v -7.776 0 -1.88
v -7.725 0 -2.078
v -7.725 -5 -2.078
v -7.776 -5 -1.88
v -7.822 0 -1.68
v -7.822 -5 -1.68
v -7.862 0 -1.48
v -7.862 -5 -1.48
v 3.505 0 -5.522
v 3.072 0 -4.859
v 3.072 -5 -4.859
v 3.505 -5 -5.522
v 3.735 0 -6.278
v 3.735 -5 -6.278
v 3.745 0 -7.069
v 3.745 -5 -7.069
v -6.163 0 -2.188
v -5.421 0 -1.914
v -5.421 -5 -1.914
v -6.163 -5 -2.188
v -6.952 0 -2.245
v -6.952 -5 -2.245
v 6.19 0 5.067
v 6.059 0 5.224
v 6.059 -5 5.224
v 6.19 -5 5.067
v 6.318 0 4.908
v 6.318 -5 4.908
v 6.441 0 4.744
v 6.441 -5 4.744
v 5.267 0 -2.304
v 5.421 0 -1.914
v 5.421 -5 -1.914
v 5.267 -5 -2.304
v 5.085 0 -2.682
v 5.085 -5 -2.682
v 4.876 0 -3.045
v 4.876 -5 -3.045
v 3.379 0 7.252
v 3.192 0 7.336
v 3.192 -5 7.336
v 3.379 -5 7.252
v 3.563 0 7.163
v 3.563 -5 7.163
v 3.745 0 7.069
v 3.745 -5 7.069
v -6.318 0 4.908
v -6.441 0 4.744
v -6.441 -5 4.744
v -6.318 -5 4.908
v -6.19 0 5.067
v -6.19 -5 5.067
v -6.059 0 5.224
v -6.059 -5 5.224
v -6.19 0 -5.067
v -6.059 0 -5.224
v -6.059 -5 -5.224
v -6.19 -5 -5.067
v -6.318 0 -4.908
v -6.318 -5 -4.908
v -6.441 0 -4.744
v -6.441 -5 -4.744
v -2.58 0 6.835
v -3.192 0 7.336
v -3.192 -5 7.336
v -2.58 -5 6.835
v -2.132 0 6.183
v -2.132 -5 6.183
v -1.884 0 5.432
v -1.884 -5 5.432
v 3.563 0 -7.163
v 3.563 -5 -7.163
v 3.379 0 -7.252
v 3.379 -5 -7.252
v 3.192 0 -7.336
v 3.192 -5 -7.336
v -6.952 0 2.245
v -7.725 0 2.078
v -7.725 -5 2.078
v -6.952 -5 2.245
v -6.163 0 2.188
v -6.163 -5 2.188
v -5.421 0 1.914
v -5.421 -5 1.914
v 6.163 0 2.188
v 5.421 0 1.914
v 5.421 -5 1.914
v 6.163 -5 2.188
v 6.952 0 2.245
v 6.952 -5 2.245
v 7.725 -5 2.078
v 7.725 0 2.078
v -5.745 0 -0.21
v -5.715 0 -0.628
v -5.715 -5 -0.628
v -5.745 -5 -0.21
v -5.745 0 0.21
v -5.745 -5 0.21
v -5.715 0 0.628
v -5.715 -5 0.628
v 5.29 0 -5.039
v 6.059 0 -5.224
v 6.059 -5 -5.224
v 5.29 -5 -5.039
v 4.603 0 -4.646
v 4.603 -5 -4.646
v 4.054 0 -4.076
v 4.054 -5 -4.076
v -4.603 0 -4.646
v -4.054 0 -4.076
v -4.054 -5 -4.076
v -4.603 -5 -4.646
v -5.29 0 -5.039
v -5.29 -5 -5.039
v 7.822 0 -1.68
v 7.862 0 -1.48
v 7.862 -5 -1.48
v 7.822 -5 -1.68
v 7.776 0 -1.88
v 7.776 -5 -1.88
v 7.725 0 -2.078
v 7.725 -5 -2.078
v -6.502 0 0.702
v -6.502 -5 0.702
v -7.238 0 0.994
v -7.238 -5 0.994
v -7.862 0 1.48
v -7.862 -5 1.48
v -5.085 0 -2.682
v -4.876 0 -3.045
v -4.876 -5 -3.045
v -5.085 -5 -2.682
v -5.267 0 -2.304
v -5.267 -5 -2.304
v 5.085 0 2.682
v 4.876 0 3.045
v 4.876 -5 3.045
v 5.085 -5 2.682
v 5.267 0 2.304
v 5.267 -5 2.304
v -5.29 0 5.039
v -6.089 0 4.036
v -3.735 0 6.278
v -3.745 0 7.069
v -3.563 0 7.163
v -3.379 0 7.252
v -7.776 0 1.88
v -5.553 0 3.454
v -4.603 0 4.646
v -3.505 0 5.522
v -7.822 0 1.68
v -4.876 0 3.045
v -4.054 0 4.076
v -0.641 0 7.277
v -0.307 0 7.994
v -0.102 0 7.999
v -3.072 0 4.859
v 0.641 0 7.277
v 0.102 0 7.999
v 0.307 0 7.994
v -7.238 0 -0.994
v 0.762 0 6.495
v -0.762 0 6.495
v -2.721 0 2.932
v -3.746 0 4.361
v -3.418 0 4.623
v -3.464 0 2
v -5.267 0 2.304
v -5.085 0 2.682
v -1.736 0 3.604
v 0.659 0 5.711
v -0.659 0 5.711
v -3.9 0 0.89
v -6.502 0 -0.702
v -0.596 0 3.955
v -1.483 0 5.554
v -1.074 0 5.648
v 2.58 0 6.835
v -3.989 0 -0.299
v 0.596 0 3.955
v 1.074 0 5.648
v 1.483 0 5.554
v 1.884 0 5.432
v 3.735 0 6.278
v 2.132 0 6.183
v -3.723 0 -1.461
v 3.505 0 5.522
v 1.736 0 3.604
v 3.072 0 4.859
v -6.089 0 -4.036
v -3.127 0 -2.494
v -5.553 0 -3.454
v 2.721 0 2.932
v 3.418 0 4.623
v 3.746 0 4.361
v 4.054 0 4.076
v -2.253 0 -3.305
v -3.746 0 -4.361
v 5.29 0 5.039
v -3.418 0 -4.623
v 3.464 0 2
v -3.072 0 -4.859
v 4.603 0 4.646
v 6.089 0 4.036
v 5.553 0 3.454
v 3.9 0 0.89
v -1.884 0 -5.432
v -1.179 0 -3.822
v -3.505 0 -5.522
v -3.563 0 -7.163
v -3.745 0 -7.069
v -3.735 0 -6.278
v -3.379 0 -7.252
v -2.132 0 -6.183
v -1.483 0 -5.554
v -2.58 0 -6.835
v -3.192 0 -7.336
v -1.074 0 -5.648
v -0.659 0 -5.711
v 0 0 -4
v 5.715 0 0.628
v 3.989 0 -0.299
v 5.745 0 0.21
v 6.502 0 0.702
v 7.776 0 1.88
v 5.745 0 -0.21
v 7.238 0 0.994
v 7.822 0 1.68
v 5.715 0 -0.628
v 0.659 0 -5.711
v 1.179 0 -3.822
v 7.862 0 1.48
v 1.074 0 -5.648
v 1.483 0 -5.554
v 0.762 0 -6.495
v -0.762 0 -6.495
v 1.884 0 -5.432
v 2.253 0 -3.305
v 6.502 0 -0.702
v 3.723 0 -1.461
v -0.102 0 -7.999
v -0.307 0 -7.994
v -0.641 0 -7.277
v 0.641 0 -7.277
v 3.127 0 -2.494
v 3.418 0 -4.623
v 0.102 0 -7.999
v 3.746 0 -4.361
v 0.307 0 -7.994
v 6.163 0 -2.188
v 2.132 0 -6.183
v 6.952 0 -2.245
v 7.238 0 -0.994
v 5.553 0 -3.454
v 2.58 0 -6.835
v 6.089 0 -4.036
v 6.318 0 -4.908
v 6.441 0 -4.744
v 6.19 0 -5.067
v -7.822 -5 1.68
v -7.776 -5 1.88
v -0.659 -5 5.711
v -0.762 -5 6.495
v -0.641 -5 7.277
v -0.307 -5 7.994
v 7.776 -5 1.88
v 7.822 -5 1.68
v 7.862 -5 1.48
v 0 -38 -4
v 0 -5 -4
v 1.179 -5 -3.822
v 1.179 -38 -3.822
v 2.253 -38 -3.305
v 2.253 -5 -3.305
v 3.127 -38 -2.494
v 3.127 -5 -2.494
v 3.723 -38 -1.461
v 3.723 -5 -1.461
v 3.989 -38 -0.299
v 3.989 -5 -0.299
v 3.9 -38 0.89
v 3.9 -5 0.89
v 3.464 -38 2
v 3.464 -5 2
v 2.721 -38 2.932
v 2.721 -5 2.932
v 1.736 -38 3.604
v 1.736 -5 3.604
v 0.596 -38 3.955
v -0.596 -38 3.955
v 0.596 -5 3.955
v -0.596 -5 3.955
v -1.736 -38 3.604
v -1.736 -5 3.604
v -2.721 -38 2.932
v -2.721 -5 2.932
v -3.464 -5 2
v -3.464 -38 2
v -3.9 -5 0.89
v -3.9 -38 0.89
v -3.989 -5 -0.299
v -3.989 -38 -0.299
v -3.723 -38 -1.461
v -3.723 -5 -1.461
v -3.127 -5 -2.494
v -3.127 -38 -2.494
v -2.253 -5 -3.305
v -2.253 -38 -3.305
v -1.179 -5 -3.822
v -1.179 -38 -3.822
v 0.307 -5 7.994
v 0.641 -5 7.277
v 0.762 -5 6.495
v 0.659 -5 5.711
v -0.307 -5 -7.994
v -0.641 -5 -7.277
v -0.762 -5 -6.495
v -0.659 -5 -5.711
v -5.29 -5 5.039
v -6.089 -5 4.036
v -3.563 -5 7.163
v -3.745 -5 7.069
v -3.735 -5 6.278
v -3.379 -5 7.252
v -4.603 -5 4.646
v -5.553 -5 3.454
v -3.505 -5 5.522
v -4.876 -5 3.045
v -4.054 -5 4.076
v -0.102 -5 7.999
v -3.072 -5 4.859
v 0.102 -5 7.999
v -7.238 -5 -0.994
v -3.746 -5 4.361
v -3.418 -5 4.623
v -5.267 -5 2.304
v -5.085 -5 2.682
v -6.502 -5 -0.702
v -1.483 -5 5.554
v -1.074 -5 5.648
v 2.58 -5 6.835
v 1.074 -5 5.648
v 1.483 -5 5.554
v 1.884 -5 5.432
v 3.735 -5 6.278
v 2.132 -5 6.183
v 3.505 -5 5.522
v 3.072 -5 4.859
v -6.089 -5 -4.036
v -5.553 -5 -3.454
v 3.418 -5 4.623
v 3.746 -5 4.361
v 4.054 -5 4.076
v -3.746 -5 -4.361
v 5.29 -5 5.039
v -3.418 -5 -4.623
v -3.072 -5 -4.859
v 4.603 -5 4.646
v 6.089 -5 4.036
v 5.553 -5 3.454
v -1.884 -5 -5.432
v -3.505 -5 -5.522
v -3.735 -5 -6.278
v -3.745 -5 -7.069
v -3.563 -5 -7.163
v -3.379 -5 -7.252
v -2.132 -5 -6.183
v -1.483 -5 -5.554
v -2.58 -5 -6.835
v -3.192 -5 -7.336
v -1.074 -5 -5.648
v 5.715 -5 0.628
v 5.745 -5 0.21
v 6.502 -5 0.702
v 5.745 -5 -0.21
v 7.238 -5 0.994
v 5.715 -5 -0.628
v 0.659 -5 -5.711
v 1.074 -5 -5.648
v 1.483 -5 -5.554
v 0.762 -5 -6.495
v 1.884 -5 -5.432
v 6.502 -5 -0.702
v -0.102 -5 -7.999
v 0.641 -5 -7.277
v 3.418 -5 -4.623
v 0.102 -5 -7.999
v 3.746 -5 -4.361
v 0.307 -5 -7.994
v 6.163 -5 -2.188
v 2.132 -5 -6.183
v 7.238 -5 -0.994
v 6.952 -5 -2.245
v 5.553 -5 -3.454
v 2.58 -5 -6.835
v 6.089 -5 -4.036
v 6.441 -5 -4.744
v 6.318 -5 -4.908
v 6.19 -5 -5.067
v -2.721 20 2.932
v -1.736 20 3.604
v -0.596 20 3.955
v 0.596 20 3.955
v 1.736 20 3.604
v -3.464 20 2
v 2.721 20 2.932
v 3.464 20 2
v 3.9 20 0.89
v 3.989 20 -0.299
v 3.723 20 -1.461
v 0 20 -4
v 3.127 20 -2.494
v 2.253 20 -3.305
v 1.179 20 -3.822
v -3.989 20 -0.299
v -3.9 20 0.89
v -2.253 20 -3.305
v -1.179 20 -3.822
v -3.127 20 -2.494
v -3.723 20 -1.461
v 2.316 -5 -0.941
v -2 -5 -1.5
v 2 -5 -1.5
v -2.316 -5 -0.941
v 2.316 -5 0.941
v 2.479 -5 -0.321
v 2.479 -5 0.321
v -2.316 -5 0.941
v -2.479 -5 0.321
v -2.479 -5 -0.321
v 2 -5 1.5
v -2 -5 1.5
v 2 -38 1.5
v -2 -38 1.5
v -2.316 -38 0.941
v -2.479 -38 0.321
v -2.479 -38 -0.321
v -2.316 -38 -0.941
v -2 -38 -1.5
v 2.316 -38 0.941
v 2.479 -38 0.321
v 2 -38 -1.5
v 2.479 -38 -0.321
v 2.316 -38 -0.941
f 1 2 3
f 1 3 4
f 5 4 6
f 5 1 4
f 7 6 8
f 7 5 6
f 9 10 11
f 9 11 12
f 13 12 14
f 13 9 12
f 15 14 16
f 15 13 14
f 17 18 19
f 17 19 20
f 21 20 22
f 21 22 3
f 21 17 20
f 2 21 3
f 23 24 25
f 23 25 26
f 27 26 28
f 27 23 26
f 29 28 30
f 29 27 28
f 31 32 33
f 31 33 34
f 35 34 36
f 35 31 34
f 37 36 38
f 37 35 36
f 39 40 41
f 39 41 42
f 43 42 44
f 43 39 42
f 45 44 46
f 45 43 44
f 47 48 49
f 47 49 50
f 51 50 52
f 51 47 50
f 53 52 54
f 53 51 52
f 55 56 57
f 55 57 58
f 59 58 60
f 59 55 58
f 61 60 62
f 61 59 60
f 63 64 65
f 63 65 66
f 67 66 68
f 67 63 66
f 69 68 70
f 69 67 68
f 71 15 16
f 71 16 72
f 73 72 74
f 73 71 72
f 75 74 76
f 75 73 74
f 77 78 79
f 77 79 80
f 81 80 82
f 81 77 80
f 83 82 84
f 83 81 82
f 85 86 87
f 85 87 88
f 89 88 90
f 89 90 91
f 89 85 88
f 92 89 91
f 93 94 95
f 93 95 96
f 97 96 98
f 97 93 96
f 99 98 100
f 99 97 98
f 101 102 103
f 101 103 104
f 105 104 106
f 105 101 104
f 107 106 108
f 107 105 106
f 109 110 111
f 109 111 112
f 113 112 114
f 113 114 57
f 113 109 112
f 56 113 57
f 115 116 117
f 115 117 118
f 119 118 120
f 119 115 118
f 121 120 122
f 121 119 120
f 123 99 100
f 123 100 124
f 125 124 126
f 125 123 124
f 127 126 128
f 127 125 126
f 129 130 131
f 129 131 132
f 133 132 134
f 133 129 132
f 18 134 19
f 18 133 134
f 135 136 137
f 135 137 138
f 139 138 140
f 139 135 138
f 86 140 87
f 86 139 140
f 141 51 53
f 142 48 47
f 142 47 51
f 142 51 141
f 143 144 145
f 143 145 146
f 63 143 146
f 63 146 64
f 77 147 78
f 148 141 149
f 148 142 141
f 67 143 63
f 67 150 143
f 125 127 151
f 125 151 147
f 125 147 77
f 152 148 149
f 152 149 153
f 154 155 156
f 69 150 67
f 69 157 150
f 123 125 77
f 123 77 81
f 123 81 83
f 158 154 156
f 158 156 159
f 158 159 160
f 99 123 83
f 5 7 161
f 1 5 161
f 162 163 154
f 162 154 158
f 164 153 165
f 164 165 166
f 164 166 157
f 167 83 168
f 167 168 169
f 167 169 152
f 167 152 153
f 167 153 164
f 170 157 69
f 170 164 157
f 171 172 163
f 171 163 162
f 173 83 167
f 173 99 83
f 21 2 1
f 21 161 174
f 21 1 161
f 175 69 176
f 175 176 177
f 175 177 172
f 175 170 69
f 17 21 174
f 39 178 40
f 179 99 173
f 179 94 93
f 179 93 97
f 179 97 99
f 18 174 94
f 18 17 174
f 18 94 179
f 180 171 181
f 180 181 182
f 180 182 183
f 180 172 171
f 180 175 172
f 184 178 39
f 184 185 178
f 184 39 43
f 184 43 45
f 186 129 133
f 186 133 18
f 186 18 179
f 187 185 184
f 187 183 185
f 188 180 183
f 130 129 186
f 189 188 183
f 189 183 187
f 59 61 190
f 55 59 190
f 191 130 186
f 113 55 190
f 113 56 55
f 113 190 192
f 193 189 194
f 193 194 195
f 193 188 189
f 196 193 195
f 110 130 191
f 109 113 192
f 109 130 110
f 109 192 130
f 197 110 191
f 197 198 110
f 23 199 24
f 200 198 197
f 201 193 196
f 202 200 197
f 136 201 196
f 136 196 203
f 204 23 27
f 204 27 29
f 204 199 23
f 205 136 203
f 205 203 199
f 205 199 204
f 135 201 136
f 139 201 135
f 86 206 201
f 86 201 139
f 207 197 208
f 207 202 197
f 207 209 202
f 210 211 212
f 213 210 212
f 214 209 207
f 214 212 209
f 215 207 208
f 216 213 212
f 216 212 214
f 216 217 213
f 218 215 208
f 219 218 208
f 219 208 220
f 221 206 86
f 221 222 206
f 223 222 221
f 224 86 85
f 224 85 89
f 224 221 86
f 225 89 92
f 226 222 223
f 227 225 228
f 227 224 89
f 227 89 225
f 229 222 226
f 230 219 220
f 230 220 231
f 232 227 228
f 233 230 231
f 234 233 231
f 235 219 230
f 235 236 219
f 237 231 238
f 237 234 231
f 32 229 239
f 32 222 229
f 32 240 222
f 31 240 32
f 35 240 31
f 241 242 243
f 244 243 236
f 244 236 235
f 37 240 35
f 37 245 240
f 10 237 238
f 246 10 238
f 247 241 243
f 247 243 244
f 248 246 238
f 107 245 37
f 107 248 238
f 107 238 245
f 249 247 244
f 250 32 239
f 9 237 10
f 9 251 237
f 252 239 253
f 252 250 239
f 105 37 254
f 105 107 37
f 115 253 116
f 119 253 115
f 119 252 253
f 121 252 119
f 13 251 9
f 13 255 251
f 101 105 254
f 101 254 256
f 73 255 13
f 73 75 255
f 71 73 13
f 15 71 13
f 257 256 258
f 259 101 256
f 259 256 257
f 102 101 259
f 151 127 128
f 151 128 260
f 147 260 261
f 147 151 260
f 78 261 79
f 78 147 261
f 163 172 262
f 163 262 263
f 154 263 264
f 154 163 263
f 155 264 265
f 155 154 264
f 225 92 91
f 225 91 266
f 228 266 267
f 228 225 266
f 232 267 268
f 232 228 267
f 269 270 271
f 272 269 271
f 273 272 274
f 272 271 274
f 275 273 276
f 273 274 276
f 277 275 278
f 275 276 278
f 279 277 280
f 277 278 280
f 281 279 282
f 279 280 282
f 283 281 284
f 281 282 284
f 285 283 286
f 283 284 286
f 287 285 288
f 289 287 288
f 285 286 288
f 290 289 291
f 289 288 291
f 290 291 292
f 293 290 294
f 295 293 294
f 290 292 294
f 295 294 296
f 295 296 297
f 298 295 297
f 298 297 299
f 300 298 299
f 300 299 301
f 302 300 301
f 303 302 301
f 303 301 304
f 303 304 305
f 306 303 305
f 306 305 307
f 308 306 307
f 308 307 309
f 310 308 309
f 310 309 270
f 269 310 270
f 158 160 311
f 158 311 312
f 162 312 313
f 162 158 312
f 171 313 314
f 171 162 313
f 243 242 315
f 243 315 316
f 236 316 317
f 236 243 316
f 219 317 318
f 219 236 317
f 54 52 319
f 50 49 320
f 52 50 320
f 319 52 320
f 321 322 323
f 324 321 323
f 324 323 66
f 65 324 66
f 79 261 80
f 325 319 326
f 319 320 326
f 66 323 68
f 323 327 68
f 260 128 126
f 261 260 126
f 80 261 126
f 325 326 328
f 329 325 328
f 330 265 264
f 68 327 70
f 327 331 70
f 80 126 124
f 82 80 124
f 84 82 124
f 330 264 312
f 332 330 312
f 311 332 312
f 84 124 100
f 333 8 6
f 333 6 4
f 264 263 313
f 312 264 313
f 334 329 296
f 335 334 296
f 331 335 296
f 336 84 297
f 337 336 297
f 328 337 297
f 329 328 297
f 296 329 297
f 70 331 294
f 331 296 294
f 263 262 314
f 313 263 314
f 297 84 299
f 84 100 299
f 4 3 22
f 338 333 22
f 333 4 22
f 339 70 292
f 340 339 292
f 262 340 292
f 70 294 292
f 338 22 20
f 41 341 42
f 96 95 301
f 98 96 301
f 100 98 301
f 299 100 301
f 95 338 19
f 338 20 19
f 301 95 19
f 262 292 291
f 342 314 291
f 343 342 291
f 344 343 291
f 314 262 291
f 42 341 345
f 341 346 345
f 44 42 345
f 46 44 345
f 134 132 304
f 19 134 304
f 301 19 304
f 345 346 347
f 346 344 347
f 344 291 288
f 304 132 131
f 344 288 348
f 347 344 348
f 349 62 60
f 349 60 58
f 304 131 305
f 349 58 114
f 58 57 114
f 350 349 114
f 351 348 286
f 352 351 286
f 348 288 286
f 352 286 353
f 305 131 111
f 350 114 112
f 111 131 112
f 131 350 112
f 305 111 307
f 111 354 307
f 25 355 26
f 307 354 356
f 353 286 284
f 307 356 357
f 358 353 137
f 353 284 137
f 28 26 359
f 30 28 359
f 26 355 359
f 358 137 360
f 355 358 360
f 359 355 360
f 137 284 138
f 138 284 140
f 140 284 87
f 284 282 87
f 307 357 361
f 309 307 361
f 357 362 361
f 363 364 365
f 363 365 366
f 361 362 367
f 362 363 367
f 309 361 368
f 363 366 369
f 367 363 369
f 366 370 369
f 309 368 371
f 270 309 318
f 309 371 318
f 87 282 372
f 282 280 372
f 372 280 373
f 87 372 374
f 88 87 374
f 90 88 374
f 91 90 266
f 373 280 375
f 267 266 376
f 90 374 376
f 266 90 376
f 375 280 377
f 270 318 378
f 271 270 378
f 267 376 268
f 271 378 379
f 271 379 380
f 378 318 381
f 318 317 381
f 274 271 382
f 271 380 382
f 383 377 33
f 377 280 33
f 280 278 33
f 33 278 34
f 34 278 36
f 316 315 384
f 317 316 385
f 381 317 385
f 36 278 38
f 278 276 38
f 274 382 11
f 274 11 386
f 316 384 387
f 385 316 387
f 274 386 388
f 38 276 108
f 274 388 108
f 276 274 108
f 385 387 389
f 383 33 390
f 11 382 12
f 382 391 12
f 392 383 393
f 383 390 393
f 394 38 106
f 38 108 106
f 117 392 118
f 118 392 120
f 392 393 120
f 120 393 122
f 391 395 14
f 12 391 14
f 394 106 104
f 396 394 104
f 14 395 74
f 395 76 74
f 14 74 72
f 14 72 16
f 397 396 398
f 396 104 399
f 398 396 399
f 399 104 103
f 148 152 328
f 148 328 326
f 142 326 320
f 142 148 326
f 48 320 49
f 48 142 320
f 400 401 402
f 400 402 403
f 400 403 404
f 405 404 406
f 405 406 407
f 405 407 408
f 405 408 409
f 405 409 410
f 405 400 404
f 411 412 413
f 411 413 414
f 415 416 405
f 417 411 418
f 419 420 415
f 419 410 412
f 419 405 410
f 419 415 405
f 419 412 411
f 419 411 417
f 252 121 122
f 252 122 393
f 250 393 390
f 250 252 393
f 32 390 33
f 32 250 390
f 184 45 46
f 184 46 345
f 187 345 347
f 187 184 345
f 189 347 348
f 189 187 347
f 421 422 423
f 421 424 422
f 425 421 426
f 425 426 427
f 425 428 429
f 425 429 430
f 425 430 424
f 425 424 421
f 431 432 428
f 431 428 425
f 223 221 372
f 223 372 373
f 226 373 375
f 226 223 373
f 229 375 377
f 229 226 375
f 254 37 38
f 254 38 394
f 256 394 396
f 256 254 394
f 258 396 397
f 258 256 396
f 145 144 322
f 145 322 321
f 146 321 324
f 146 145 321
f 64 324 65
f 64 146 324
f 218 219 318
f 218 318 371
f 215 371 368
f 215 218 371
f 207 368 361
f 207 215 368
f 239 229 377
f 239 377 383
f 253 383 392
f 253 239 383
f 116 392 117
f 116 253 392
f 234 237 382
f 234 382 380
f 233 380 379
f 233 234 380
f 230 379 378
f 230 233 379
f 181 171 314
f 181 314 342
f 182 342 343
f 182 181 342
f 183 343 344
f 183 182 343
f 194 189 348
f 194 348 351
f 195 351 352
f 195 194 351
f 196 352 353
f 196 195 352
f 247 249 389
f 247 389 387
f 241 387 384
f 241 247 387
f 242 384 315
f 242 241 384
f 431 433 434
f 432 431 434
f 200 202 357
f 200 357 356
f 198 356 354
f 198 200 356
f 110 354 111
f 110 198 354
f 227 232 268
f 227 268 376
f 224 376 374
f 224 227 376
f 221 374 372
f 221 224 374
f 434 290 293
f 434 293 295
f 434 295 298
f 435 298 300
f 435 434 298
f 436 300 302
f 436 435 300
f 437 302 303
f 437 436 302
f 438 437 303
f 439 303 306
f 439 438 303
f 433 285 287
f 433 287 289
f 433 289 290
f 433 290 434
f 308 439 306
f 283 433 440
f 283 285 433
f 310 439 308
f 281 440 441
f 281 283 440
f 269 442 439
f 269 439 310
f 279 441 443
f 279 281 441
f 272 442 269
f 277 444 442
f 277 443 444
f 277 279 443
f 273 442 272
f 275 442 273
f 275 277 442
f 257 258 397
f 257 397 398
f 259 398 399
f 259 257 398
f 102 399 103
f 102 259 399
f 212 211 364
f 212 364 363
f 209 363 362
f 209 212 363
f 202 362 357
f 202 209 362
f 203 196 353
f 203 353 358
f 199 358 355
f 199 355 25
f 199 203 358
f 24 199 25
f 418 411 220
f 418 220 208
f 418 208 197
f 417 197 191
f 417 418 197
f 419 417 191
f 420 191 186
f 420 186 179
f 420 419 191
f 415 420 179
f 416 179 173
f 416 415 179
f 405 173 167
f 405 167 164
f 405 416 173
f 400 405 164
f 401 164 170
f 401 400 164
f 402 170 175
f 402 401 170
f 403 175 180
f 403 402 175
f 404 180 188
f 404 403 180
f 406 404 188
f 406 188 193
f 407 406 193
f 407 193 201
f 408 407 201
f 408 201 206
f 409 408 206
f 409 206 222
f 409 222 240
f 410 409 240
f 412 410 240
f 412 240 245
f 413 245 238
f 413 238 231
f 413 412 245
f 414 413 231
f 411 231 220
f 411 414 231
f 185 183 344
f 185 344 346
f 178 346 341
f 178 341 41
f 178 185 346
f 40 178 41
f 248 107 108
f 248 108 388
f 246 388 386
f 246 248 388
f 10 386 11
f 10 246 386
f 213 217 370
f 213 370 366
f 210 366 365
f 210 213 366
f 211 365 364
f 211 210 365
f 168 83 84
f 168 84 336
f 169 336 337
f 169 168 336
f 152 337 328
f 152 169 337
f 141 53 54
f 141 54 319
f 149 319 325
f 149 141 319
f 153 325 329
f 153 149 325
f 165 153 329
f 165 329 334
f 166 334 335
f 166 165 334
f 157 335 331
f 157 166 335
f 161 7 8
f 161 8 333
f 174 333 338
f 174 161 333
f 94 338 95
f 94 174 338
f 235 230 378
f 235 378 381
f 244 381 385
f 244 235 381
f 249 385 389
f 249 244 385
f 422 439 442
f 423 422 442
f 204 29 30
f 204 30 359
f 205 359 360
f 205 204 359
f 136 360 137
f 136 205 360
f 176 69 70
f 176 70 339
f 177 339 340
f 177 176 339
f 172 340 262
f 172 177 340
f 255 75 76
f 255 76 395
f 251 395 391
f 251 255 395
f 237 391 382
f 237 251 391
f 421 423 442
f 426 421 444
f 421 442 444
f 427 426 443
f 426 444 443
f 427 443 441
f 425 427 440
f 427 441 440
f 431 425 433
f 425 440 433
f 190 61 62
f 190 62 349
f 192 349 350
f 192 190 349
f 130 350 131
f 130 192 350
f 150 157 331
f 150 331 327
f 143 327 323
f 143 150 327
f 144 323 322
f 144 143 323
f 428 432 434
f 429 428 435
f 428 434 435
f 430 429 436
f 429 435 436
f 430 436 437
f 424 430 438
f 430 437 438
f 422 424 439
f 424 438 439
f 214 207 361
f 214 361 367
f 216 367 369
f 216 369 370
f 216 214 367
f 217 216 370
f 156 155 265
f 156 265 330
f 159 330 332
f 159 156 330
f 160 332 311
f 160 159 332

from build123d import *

# Parameters (mm, degrees)
SKETCH1_R                = 0.4
BOSS_EXTRUDE1_DEPTH      = 5
BOSS_EXTRUDE2_DEPTH      = 33
BOSS_EXTRUDE2_DEPTH_BACK = 5
SKETCH2_R                = 4
BOSS_EXTRUDE3_START      = 20
SKETCH3_R                = 4
BOSS_EXTRUDE3_DEPTH      = 20
CUT_EXTRUDE1_DEPTH       = 33


with BuildPart() as part:
    # Sketch1 → Boss-Extrude1 (new body)
    with BuildSketch(Plane(origin=(0, 0, 0), x_dir=(1, 0, 0), z_dir=(0, 1, 0))):
        with BuildLine():
            ThreePointArc((3.744900382, -7.069350828), (3.64692573, -5.891768521), (3.071904032, -4.859465672))
            ThreePointArc((3.071904032, -4.859465672), (3.584442871, -4.494749193), (4.054065768, -4.076217824))
            ThreePointArc((4.054065768, -4.076217824), (4.932532263, -4.866531521), (6.058788713, -5.224086459))
            ThreePointArc((6.058788713, -5.224086459), (6.25465186, -4.987918415), (6.441315028, -4.744413632))
            ThreePointArc((6.441315028, -4.744413632), (5.842109102, -3.725958242), (4.876133034, -3.045378078))
            ThreePointArc((4.876133034, -3.045378078), (5.179670022, -2.494397616), (5.421191676, -1.913552144))
            ThreePointArc((5.421191676, -1.913552144), (6.555566902, -2.244447854), (7.725426174, -2.077929362))
            ThreePointArc((7.725426174, -2.077929362), (7.799423297, -1.780167472), (7.861948235, -1.47978713))
            ThreePointArc((7.861948235, -1.47978713), (6.880191117, -0.822176238), (5.714584087, -0.628116006))
            ThreePointArc((5.714584087, -0.628116006), (5.749, 0), (5.714584087, 0.628116006))
            ThreePointArc((5.714584087, 0.628116006), (6.880191117, 0.822176238), (7.861948235, 1.47978713))
            ThreePointArc((7.861948235, 1.47978713), (7.799423297, 1.780167472), (7.725426174, 2.077929362))
            ThreePointArc((7.725426174, 2.077929362), (6.555566902, 2.244447854), (5.421191676, 1.913552144))
            ThreePointArc((5.421191676, 1.913552144), (5.179670022, 2.494397616), (4.876133034, 3.045378078))
            ThreePointArc((4.876133034, 3.045378078), (5.842109102, 3.725958242), (6.441315028, 4.744413632))
            ThreePointArc((6.441315028, 4.744413632), (6.25465186, 4.987918415), (6.058788713, 5.224086459))
            ThreePointArc((6.058788713, 5.224086459), (4.932532263, 4.866531521), (4.054065768, 4.076217824))
            ThreePointArc((4.054065768, 4.076217824), (3.584442871, 4.494749193), (3.071904032, 4.859465672))
            ThreePointArc((3.071904032, 4.859465672), (3.64692573, 5.891768521), (3.744900382, 7.069350828))
            ThreePointArc((3.744900382, 7.069350828), (3.471069913, 7.207750943), (3.192133841, 7.335549164))
            ThreePointArc((3.192133841, 7.335549164), (2.332549116, 6.524738937), (1.883982415, 5.431538572))
            ThreePointArc((1.883982415, 5.431538572), (1.279272849, 5.604860567), (0.659246762, 5.711076493))
            ThreePointArc((0.659246762, 5.711076493), (0.72942399, 6.890641786), (0.306762287, 7.994116393))
            ThreePointArc((0.306762287, 7.994116393), (0, 8), (-0.306762287, 7.994116393))
            ThreePointArc((-0.306762287, 7.994116393), (-0.72942399, 6.890641786), (-0.659246762, 5.711076493))
            ThreePointArc((-0.659246762, 5.711076493), (-1.279272849, 5.604860567), (-1.883982415, 5.431538572))
            ThreePointArc((-1.883982415, 5.431538572), (-2.332549116, 6.524738937), (-3.192133841, 7.335549164))
            ThreePointArc((-3.192133841, 7.335549164), (-3.471069913, 7.207750943), (-3.744900382, 7.069350828))
            ThreePointArc((-3.744900382, 7.069350828), (-3.64692573, 5.891768521), (-3.071904032, 4.859465672))
            ThreePointArc((-3.071904032, 4.859465672), (-3.584442871, 4.494749193), (-4.054065768, 4.076217824))
            ThreePointArc((-4.054065768, 4.076217824), (-4.932532263, 4.866531521), (-6.058788713, 5.224086459))
            ThreePointArc((-6.058788713, 5.224086459), (-6.25465186, 4.987918415), (-6.441315028, 4.744413632))
            ThreePointArc((-6.441315028, 4.744413632), (-5.842109102, 3.725958242), (-4.876133034, 3.045378078))
            ThreePointArc((-4.876133034, 3.045378078), (-5.179670022, 2.494397616), (-5.421191676, 1.913552144))
            ThreePointArc((-5.421191676, 1.913552144), (-6.555566902, 2.244447854), (-7.725426174, 2.077929362))
            ThreePointArc((-7.725426174, 2.077929362), (-7.799423297, 1.780167472), (-7.861948235, 1.47978713))
            ThreePointArc((-7.861948235, 1.47978713), (-6.880191117, 0.822176238), (-5.714584087, 0.628116006))
            ThreePointArc((-5.714584087, 0.628116006), (-5.749, 0), (-5.714584087, -0.628116006))
            ThreePointArc((-5.714584087, -0.628116006), (-6.880191117, -0.822176238), (-7.861948235, -1.47978713))
            ThreePointArc((-7.861948235, -1.47978713), (-7.799423297, -1.780167472), (-7.725426174, -2.077929362))
            ThreePointArc((-7.725426174, -2.077929362), (-6.555566902, -2.244447854), (-5.421191676, -1.913552144))
            ThreePointArc((-5.421191676, -1.913552144), (-5.179670022, -2.494397616), (-4.876133034, -3.045378078))
            ThreePointArc((-4.876133034, -3.045378078), (-5.842109102, -3.725958242), (-6.441315028, -4.744413632))
            ThreePointArc((-6.441315028, -4.744413632), (-6.25465186, -4.987918415), (-6.058788713, -5.224086459))
            ThreePointArc((-6.058788713, -5.224086459), (-4.932532263, -4.866531521), (-4.054065768, -4.076217824))
            ThreePointArc((-4.054065768, -4.076217824), (-3.584442871, -4.494749193), (-3.071904032, -4.859465672))
            ThreePointArc((-3.071904032, -4.859465672), (-3.64692573, -5.891768521), (-3.744900382, -7.069350828))
            ThreePointArc((-3.744900382, -7.069350828), (-3.471069913, -7.207750943), (-3.192133841, -7.335549164))
            ThreePointArc((-3.192133841, -7.335549164), (-2.332549116, -6.524738937), (-1.883982415, -5.431538572))
            ThreePointArc((-1.883982415, -5.431538572), (-1.279272849, -5.604860567), (-0.659246762, -5.711076493))
            ThreePointArc((-0.659246762, -5.711076493), (-0.72942399, -6.890641786), (-0.306762287, -7.994116393))
            ThreePointArc((-0.306762287, -7.994116393), (0, -8), (0.306762287, -7.994116393))
            ThreePointArc((0.306762287, -7.994116393), (0.72942399, -6.890641786), (0.659246762, -5.711076493))
            ThreePointArc((0.659246762, -5.711076493), (1.279272849, -5.604860567), (1.883982415, -5.431538572))
            ThreePointArc((1.883982415, -5.431538572), (2.332549116, -6.524738937), (3.192133841, -7.335549164))
            ThreePointArc((3.192133841, -7.335549164), (3.471069913, -7.207750943), (3.744900382, -7.069350828))
        make_face()
        with Locations(Location((0, 0, 0), (0, 0, 90))):
            Circle(SKETCH1_R, mode=Mode.SUBTRACT)
    extrude(amount=-BOSS_EXTRUDE1_DEPTH)

    # Sketch2 → Boss-Extrude2 (add, two sides: drawn at the far end of the back side and taken through both)
    with BuildSketch(Plane.XZ.offset(5).offset(-BOSS_EXTRUDE2_DEPTH_BACK)):
        with Locations(Location((0, 0, 0), (0, 0, 270))):
            Circle(SKETCH2_R)
    extrude(amount=BOSS_EXTRUDE2_DEPTH + BOSS_EXTRUDE2_DEPTH_BACK)

    # Sketch3 → Boss-Extrude3 (add)
    with BuildSketch(Plane(origin=(0, 0, 0), x_dir=(1, 0, 0), z_dir=(0, 1, 0)).offset(BOSS_EXTRUDE3_START)):
        with Locations(Location((0, 0, 0), (0, 0, 90))):
            Circle(SKETCH3_R)
    extrude(amount=-BOSS_EXTRUDE3_DEPTH)

    # Sketch4 → Cut-Extrude1 (cut)
    with BuildSketch(Plane.XZ.offset(38)):
        with BuildLine():
            Line((-2, -1.5), (2, -1.5))
            ThreePointArc((2, -1.5), (2.5, 0), (2, 1.5))
            Line((2, 1.5), (-2, 1.5))
            ThreePointArc((-2, 1.5), (-2.5, 0), (-2, -1.5))
        make_face()
    extrude(amount=-CUT_EXTRUDE1_DEPTH, mode=Mode.SUBTRACT)


solid = part.part
